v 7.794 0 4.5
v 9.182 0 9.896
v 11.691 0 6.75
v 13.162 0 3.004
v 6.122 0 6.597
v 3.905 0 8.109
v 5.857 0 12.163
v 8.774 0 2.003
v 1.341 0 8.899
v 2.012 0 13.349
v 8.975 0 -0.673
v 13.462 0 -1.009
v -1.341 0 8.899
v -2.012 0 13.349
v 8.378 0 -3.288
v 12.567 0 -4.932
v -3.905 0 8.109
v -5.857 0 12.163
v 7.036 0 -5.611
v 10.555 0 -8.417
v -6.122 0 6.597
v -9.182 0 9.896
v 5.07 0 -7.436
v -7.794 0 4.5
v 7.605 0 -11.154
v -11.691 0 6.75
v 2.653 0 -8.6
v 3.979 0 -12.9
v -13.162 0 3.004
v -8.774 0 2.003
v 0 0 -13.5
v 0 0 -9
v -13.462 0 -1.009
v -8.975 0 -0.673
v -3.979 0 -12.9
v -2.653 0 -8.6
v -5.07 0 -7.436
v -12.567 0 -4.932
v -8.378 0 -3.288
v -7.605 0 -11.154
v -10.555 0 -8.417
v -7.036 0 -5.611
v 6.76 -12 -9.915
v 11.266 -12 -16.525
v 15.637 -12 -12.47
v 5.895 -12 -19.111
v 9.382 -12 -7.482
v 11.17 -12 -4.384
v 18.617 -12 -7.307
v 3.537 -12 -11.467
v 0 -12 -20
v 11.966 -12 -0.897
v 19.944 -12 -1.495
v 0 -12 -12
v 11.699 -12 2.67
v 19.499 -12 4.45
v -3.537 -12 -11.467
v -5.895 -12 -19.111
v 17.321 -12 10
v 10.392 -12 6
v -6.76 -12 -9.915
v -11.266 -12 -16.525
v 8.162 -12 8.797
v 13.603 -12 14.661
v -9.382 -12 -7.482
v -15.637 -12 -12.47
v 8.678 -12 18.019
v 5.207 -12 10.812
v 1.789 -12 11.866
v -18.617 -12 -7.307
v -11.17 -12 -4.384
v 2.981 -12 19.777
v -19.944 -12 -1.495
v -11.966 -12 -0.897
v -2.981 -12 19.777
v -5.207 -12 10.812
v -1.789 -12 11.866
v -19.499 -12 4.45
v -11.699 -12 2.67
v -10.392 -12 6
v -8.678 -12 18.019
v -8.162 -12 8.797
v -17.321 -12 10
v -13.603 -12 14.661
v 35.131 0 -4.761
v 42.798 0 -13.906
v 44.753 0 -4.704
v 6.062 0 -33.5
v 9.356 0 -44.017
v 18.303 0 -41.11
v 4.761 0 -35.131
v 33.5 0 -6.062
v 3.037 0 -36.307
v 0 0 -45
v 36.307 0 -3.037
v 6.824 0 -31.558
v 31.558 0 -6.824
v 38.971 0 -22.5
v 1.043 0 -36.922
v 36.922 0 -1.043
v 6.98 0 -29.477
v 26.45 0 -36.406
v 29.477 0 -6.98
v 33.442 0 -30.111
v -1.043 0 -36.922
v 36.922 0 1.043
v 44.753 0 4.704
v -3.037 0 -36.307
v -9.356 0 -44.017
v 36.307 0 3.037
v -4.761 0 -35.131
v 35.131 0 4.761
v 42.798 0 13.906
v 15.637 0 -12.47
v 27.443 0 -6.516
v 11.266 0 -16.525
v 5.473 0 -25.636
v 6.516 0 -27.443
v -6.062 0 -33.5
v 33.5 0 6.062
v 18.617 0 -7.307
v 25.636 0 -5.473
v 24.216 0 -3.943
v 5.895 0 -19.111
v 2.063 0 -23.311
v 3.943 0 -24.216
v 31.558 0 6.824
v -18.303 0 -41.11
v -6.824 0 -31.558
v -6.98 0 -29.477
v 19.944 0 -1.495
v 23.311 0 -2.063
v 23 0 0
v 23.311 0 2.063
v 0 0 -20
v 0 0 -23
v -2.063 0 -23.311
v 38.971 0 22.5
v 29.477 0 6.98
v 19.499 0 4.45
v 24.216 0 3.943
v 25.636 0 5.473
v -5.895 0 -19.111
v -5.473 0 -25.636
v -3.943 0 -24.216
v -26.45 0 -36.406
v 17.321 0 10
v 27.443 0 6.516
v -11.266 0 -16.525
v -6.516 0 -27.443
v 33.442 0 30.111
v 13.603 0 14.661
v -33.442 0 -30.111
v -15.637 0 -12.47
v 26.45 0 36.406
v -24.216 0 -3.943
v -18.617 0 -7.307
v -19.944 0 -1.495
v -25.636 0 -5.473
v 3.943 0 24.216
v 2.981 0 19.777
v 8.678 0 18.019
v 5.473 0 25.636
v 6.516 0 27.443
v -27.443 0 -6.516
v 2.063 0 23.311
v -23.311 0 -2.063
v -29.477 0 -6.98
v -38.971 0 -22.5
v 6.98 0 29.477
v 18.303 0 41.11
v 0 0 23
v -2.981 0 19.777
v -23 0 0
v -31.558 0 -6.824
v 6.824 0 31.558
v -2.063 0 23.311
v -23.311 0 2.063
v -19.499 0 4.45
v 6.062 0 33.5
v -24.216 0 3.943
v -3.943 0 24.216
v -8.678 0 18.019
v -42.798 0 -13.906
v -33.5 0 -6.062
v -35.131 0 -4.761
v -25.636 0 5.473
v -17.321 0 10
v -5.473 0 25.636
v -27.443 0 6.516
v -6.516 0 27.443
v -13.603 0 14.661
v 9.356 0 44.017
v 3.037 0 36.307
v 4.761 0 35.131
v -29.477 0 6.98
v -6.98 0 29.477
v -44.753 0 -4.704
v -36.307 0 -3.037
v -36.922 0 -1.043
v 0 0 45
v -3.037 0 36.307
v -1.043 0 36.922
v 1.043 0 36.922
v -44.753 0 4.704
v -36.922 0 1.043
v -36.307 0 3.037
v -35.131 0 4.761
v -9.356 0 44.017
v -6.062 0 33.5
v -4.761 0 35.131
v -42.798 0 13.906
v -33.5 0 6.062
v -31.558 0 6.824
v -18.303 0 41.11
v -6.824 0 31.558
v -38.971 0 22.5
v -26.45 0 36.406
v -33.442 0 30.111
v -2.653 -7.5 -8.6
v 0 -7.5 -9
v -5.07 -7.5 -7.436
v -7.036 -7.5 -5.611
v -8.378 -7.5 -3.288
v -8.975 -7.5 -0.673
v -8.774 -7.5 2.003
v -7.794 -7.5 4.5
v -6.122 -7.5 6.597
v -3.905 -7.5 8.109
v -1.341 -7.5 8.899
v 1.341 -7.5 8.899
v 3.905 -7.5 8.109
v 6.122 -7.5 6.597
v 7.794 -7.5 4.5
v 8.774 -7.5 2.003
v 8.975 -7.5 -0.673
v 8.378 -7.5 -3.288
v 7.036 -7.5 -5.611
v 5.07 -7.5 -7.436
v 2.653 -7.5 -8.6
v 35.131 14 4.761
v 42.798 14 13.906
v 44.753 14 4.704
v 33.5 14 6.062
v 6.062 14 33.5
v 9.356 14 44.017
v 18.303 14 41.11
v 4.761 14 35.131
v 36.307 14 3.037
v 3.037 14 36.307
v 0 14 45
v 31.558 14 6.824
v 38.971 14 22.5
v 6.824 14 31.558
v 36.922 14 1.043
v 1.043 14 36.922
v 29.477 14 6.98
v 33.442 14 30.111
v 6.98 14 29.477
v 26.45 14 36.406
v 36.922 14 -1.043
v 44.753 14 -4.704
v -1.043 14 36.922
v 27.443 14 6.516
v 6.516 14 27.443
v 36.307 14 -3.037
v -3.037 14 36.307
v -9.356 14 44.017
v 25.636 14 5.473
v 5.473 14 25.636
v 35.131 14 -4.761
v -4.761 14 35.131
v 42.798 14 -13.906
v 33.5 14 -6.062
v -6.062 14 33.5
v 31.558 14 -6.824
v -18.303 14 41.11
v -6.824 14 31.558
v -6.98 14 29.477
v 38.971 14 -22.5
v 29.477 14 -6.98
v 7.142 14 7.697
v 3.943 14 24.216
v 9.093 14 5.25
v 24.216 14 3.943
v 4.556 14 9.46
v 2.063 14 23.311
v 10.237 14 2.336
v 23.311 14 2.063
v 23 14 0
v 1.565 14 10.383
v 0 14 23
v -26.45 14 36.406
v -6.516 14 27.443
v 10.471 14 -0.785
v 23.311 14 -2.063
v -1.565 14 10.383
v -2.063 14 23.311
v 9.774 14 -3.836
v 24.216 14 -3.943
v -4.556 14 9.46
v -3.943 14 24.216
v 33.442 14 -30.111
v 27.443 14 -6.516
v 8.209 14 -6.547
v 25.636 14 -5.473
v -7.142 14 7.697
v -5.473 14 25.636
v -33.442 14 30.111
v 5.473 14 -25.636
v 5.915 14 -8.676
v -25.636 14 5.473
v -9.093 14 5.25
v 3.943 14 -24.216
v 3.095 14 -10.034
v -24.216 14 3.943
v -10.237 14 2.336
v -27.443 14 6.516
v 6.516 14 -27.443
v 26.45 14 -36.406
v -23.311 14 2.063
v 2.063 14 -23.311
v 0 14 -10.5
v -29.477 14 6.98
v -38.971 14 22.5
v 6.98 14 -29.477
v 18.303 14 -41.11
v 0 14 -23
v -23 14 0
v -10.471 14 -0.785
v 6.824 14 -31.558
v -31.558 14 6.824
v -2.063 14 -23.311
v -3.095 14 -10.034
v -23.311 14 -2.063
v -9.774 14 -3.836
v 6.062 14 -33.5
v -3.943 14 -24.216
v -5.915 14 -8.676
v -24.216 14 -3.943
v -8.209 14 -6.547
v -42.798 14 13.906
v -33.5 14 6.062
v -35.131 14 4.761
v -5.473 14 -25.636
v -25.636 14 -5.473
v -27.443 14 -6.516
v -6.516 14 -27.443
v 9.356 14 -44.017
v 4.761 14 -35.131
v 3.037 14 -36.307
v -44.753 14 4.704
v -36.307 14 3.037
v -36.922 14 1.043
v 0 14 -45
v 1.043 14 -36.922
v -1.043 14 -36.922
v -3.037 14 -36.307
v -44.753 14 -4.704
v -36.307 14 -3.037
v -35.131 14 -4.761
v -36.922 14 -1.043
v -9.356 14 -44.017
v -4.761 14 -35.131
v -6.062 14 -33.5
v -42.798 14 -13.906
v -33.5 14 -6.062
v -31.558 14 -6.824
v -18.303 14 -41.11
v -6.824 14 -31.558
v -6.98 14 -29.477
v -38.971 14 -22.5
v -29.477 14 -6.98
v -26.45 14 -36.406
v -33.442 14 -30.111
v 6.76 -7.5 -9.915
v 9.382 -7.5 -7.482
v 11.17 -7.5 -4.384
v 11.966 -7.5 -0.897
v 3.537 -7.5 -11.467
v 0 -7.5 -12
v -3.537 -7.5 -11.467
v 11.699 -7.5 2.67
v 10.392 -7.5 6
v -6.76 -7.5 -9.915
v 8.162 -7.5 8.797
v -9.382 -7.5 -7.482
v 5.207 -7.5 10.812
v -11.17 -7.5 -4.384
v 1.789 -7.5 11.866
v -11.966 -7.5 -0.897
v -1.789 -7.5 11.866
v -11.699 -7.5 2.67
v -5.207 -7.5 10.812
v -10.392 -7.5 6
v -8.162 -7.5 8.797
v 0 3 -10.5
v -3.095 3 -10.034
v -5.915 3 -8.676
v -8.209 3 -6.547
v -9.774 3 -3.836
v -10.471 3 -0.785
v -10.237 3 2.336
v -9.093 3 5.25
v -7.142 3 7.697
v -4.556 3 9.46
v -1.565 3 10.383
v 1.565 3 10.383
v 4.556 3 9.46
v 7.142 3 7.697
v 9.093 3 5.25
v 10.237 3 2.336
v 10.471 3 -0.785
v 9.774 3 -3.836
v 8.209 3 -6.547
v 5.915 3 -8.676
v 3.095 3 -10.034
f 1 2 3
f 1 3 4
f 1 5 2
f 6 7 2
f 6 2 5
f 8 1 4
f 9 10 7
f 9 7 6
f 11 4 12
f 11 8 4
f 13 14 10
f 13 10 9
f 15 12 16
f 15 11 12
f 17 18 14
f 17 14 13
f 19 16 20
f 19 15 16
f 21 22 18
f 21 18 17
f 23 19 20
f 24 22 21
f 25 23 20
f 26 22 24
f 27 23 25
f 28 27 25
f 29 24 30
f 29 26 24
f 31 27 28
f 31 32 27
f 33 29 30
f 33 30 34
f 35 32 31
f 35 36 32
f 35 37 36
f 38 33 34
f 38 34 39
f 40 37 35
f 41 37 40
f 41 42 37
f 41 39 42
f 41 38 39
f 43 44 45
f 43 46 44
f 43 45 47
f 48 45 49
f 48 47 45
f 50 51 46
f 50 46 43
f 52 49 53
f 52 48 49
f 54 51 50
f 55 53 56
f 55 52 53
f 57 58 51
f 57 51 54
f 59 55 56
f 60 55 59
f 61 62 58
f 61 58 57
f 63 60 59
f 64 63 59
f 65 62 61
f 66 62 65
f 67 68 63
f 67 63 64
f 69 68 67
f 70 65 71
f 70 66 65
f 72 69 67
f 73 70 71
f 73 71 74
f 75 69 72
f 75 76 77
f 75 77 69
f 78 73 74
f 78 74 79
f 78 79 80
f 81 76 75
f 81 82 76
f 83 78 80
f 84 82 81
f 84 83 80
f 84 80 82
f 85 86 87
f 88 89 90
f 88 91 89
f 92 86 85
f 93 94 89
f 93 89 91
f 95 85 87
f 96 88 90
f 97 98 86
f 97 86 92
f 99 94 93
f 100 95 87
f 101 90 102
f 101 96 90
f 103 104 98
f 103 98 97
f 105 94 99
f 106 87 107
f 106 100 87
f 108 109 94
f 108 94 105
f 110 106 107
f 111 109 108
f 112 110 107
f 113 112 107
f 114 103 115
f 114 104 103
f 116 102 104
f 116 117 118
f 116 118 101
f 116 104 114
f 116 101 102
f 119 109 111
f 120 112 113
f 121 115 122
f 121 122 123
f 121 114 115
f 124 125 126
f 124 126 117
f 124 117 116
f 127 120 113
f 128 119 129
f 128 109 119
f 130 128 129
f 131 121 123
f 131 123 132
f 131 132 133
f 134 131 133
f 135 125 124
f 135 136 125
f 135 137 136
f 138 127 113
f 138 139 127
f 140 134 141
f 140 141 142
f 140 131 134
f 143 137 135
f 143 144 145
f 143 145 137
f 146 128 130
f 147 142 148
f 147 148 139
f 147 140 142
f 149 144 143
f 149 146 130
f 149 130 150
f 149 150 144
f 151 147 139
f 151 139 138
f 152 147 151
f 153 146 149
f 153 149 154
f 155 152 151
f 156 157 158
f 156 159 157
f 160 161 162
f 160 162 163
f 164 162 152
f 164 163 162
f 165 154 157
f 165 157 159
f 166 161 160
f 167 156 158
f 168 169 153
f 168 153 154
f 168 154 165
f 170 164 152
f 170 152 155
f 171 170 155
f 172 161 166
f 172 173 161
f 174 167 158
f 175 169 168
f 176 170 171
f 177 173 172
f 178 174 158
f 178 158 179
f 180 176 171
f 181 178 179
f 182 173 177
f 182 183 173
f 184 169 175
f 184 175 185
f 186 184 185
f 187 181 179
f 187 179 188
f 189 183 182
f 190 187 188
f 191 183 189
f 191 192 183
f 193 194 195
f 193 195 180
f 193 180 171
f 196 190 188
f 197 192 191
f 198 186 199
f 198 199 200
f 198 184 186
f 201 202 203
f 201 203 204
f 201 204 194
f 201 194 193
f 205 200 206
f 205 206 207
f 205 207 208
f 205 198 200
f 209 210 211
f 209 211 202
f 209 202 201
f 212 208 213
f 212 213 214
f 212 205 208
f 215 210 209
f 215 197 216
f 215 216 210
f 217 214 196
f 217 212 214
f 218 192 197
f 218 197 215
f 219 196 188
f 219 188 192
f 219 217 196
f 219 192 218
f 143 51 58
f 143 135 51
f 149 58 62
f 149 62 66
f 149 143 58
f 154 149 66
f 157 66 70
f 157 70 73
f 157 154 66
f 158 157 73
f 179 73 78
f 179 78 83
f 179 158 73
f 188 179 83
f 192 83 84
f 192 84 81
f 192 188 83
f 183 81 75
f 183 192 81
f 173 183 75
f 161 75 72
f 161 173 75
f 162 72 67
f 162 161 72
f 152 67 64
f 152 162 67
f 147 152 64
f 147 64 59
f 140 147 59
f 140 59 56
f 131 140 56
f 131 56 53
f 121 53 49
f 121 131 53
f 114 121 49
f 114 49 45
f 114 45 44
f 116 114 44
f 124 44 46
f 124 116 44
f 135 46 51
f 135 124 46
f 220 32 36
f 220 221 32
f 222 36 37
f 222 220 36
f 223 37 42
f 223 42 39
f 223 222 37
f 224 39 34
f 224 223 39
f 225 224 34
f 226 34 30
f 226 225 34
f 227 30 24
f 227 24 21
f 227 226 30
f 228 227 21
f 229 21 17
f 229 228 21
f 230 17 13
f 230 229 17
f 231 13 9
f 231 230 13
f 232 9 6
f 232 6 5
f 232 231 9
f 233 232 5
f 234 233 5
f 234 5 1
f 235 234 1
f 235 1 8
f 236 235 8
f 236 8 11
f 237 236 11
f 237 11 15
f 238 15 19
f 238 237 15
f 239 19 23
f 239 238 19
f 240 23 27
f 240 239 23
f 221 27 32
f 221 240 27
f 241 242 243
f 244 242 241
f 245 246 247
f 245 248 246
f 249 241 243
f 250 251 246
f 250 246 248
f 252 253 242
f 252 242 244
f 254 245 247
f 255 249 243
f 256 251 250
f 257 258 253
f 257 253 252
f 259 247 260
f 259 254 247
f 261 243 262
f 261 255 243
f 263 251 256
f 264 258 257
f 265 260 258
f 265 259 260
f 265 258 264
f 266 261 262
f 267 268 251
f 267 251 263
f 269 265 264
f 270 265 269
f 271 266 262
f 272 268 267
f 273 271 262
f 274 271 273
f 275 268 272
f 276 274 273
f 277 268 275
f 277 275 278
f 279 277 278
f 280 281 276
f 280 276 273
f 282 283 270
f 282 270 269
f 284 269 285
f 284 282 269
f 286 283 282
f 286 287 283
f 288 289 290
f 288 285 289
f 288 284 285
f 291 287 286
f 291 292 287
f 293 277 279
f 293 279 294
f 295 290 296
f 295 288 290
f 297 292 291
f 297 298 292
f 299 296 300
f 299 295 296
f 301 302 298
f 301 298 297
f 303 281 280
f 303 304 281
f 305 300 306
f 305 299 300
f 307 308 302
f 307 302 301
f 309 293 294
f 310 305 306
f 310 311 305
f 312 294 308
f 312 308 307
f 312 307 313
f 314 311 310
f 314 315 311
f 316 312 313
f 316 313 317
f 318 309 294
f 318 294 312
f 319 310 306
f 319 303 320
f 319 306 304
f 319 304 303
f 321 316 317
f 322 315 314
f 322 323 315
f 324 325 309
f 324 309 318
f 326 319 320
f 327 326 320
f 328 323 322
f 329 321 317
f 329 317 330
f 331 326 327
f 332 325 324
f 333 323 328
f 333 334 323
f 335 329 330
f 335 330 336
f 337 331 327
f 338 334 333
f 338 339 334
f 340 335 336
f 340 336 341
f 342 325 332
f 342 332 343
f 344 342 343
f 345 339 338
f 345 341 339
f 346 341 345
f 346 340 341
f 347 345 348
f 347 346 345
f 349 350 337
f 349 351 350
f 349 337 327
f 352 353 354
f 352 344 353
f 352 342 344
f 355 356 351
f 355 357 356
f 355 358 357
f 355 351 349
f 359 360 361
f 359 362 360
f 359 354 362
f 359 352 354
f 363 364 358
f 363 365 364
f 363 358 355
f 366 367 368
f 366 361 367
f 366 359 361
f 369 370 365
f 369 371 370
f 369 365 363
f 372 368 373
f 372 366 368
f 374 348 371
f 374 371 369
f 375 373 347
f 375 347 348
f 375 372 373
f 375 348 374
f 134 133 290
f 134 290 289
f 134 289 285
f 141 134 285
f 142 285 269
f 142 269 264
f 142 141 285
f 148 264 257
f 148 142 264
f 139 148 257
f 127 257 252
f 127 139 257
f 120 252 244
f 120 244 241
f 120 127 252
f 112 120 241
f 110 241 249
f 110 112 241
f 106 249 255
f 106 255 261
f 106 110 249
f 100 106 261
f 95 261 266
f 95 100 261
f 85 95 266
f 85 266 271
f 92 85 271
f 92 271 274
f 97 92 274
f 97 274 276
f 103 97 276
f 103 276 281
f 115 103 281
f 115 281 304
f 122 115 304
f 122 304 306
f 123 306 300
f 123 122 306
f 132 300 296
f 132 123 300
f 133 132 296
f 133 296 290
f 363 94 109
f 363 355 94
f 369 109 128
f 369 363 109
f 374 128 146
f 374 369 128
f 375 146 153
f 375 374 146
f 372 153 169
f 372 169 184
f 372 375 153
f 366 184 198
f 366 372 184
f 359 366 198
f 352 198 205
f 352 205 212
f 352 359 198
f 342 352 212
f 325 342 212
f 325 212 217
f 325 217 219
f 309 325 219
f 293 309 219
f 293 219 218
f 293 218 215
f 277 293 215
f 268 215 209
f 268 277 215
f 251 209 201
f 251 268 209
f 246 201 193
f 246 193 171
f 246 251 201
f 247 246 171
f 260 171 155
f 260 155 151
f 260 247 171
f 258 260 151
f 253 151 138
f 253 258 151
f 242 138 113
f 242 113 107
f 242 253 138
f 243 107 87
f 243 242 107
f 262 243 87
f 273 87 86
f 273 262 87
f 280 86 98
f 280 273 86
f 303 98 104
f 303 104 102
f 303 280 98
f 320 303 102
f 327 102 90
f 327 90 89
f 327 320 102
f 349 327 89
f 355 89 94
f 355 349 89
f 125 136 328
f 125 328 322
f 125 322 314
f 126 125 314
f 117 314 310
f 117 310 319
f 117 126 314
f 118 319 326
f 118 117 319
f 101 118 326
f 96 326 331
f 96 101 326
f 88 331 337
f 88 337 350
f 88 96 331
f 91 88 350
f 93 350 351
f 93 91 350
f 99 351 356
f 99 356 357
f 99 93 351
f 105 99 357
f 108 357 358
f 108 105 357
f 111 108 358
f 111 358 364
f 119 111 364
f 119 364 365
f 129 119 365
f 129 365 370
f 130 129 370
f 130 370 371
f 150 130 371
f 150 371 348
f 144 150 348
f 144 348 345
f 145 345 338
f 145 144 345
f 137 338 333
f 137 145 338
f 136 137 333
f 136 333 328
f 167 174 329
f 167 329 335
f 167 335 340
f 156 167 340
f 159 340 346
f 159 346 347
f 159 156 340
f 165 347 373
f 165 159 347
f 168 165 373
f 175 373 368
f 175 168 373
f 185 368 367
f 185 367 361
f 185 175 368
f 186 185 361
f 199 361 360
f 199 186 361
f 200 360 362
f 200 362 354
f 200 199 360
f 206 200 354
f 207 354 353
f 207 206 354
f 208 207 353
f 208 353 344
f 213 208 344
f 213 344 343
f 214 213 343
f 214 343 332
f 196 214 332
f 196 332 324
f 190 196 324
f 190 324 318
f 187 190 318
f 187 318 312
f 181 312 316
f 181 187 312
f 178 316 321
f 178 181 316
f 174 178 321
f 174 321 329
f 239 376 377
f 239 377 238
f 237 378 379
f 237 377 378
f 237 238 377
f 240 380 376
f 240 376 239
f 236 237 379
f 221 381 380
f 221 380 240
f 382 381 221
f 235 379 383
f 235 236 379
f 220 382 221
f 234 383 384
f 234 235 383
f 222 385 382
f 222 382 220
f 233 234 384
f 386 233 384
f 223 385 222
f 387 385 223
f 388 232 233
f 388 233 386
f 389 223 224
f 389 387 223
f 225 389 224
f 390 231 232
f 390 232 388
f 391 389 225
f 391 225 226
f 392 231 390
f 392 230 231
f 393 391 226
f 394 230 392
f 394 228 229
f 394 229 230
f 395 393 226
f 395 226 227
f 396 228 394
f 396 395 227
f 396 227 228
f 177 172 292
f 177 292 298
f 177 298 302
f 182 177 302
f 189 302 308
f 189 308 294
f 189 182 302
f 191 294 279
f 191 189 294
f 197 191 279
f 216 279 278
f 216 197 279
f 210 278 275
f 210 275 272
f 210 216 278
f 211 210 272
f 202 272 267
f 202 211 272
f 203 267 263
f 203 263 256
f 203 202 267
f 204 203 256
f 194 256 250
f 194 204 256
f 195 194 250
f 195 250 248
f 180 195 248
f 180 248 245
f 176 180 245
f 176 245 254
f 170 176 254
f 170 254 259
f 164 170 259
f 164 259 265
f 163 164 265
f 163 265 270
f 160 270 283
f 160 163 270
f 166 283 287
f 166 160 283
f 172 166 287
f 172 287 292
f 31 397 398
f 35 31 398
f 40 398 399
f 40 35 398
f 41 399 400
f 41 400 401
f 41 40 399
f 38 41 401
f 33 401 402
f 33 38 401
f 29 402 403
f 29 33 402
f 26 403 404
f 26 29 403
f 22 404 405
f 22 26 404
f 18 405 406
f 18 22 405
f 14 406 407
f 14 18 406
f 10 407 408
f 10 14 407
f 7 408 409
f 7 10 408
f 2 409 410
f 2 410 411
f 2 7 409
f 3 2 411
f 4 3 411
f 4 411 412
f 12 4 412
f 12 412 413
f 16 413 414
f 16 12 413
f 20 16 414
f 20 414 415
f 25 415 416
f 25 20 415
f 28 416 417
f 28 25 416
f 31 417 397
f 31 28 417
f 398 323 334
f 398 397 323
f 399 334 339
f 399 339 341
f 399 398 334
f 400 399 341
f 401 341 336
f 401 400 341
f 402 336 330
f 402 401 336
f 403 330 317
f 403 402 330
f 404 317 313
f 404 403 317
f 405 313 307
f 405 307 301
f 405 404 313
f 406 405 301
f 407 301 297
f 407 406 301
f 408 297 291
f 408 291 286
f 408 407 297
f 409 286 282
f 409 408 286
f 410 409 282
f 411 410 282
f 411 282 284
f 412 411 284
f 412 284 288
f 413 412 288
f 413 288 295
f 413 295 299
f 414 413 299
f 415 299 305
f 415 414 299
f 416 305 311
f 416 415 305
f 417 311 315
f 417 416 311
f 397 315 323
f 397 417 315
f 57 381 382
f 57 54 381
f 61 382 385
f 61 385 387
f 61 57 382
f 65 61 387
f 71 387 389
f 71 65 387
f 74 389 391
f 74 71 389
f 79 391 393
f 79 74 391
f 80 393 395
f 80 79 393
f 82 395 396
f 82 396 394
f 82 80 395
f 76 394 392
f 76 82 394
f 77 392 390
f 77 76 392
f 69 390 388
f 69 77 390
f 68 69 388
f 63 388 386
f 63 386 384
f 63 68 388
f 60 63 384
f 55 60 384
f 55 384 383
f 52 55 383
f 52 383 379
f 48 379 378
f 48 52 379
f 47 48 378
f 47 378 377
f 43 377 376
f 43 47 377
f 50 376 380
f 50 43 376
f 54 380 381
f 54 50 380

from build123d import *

# Parameters (mm, degrees)
SKETCH_3_R               = 7
CUT_EXTRUDE_1_DEPTH      = 14
PATTERN_CIRCULAR_1_COUNT = 4


with BuildPart() as part:
    # 草图2 → 旋转1 (revolve)
    with BuildSketch(Plane(origin=(0, 0, 0), x_dir=(0, 0, -1), z_dir=(1, 0, 0))):
        Polygon((12, -12), (20, -12), (20, -7.5), (20, 0), (45, 0), (45, 14), (10.5, 14), (10.5, 3), (13.5, 0), (9, 0), (9, -7.5), (12, -7.5), align=None)
    revolve(axis=Axis((0, 0, 0), (0, 1, 0)))

    # 草图3 → 切除-拉伸1 (cut)
    with BuildSketch(Plane(origin=(0, 0, 0), x_dir=(1, 0, 0), z_dir=(0, 1, 0))):
        with Locations(Location((0, 30, 0), (0, 0, 270))):
            Circle(SKETCH_3_R)
    cut_extrude_1 = extrude(amount=CUT_EXTRUDE_1_DEPTH, mode=Mode.SUBTRACT)

    # 阵列(圆周)1: 切除-拉伸1 ×4 about axis
    pattern_circular_1_axis = Axis((0, 0, 0), (0, 1, 0))
    for i in range(1, PATTERN_CIRCULAR_1_COUNT):
        add(cut_extrude_1.rotate(pattern_circular_1_axis, i * 360 / PATTERN_CIRCULAR_1_COUNT), mode=Mode.SUBTRACT)


solid = part.part
